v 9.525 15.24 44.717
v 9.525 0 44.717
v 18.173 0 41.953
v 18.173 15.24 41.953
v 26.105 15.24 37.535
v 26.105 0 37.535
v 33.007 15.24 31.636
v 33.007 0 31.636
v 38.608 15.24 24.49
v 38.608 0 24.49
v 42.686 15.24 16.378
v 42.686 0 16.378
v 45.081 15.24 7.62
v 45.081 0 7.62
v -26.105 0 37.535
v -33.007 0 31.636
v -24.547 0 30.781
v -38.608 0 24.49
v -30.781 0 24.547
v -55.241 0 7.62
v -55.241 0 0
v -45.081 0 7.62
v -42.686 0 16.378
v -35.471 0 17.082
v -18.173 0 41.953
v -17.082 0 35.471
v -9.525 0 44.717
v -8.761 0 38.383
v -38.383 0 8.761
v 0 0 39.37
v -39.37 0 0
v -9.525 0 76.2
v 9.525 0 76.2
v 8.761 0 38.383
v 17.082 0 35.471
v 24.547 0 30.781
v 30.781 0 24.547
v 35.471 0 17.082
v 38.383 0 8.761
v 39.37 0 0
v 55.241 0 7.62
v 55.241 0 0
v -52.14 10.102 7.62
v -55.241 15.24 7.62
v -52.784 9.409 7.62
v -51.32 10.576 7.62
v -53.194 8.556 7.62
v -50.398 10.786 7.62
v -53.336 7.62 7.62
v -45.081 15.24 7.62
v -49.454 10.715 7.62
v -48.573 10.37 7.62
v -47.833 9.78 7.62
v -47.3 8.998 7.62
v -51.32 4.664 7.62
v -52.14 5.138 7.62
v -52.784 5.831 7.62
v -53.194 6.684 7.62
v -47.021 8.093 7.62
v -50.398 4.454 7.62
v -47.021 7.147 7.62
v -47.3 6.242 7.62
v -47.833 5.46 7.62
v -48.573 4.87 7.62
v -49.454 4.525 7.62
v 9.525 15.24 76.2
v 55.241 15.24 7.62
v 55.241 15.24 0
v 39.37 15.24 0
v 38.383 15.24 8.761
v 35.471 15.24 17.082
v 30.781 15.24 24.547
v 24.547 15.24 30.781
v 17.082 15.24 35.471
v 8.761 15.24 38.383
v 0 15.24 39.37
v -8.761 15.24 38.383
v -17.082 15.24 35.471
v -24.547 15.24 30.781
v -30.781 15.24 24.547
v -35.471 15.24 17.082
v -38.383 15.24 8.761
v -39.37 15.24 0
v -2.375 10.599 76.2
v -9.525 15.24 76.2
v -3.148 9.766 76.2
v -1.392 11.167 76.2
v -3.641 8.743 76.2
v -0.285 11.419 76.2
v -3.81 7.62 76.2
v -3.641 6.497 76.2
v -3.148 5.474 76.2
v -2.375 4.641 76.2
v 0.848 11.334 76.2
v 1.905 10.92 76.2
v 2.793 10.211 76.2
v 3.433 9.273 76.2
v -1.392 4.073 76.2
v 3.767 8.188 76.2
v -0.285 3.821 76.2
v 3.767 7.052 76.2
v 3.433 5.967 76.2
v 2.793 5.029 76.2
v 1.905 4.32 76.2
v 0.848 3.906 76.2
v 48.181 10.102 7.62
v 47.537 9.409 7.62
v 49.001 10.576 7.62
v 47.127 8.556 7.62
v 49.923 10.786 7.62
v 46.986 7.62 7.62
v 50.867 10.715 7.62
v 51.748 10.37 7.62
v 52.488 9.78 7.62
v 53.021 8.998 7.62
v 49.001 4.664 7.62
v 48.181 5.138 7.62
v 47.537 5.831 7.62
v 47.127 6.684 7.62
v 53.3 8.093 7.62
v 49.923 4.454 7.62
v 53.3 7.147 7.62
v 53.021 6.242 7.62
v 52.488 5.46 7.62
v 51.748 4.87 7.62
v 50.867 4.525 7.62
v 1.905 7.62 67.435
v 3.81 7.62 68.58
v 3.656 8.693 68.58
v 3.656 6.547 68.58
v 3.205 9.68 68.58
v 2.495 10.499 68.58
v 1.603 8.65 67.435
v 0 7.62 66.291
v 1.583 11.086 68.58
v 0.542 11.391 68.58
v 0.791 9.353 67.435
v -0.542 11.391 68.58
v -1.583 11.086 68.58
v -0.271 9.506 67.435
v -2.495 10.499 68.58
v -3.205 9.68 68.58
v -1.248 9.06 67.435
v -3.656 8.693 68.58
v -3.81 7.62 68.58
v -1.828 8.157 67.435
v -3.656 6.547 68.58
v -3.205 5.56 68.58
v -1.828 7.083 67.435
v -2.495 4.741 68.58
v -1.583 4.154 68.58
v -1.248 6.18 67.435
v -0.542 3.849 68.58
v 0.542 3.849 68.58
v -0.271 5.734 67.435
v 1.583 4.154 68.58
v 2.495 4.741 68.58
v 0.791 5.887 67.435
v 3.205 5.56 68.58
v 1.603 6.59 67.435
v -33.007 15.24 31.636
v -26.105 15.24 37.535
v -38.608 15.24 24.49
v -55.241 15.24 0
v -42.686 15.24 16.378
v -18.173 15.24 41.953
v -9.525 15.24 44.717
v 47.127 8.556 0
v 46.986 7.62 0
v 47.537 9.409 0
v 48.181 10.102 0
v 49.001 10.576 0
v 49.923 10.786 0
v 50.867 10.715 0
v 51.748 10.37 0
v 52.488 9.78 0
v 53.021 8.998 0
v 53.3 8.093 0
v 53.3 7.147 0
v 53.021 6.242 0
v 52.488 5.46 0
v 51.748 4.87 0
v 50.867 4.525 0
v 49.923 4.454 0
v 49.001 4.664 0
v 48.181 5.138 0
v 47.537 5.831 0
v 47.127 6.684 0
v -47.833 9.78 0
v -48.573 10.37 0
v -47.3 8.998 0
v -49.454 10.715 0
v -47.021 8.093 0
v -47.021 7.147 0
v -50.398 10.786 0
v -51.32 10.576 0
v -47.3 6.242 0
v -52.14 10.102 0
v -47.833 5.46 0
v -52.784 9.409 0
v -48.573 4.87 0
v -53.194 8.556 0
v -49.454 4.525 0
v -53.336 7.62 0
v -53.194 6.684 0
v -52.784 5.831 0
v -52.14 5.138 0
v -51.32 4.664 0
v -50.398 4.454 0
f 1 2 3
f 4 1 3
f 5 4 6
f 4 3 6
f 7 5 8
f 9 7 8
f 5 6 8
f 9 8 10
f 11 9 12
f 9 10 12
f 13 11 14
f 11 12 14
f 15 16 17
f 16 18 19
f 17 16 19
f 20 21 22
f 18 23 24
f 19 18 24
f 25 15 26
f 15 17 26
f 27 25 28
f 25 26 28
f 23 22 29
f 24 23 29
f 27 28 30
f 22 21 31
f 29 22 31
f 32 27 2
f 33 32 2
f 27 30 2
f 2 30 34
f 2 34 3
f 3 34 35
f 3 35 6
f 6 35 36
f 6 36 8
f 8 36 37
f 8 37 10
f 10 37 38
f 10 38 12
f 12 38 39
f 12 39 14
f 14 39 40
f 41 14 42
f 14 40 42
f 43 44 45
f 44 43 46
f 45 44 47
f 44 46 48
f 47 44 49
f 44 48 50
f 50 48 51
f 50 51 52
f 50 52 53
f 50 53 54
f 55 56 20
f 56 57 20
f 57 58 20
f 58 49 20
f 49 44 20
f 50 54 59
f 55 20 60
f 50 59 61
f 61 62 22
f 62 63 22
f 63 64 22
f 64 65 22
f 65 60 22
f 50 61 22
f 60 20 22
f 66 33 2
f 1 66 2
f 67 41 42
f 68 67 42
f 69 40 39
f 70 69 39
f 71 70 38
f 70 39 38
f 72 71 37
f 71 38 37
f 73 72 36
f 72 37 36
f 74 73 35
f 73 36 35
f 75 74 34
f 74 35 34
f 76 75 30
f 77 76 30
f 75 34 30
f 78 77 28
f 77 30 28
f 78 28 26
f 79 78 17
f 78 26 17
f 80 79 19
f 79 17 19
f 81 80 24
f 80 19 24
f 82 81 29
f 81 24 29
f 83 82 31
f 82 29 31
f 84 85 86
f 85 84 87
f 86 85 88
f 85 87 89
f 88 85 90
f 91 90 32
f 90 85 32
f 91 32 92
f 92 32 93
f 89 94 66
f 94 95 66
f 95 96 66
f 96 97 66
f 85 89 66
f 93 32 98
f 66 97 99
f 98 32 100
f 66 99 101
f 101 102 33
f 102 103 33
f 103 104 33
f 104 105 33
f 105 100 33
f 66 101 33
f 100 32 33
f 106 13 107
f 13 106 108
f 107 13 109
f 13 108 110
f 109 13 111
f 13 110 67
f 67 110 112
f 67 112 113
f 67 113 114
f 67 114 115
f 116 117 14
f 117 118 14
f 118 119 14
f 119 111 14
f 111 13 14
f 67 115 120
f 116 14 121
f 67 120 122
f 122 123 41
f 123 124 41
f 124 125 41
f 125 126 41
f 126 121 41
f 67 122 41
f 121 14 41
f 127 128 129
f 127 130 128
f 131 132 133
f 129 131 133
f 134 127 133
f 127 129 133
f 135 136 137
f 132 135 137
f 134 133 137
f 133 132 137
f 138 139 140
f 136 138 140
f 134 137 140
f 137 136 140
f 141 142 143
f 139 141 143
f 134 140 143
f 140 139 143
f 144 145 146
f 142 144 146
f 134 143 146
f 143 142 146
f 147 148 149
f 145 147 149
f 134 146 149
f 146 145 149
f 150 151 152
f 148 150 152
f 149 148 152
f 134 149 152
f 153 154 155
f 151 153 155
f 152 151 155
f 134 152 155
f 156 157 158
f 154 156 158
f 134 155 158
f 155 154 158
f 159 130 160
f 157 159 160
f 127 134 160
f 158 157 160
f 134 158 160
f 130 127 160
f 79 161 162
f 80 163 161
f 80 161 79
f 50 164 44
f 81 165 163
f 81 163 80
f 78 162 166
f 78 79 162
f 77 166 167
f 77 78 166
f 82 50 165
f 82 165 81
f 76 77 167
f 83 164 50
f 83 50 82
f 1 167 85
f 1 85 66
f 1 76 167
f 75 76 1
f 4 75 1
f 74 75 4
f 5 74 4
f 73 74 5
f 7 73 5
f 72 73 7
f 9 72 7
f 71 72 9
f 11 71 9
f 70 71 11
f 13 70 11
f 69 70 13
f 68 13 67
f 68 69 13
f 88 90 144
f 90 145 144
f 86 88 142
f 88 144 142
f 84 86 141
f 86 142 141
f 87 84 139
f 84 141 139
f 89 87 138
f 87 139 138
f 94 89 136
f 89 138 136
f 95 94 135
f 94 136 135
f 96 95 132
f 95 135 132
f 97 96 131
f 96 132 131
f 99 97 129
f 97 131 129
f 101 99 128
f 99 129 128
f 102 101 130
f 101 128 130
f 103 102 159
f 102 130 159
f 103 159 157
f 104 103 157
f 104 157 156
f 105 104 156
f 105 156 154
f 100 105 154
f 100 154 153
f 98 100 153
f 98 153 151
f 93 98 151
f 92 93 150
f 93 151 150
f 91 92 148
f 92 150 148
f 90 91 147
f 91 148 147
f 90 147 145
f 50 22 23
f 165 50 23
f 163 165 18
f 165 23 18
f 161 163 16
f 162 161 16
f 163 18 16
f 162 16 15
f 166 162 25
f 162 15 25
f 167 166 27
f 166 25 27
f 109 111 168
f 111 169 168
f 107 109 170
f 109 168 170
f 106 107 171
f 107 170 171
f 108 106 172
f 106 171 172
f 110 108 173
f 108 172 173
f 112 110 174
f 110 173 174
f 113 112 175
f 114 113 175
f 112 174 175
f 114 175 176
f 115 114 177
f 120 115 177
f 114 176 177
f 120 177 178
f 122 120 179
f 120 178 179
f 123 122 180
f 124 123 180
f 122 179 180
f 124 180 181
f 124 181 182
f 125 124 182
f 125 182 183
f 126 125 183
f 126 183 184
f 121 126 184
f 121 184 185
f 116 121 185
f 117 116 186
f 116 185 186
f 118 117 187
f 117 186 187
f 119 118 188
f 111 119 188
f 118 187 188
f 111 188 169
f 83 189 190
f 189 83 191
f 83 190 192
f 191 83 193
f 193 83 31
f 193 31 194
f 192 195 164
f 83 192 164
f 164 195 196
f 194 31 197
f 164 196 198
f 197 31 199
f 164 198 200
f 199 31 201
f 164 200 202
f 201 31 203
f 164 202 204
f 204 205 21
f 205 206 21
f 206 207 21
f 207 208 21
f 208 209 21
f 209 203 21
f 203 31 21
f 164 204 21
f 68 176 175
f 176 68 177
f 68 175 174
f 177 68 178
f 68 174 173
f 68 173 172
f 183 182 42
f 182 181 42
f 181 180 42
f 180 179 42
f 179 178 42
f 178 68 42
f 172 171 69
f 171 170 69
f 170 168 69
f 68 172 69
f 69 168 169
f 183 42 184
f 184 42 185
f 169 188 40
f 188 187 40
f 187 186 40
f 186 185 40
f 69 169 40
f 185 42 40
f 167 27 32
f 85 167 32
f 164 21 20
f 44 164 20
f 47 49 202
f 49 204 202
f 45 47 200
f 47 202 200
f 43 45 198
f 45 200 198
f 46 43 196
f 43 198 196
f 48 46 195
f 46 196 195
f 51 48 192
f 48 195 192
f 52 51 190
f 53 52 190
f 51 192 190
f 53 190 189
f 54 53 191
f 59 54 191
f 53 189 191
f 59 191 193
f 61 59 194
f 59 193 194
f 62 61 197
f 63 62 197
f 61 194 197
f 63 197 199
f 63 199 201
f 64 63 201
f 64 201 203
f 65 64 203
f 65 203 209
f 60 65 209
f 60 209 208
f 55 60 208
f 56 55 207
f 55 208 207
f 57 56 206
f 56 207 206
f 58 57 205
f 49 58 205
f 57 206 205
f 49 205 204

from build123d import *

# Parameters (mm, degrees)
BOSS_EXTRUDE1_DEPTH              = 15.24
TAP_DRILL_FOR_M10X1_0_TAP1_D     = 7.62
TAP_DRILL_FOR_M10X1_0_TAP1_DEPTH = 7.62
TAP_DRILL_FOR_M10X1_0_TAP1_TIP   = 2.289278958
TAP_DRILL_FOR_M10X1_0_TAP3_D     = 6.35
TAP_DRILL_FOR_M10X1_0_TAP3_DEPTH = 7.62
TAP_DRILL_FOR_M10X1_0_TAP3_TIP   = 1.907732465


with BuildPart() as part:
    # Sketch1 → Boss-Extrude1 (new body)
    with BuildSketch(Plane(origin=(0, 0, 0), x_dir=(1, 0, 0), z_dir=(0, 1, 0))):
        with BuildLine():
            Line((-39.37, 0), (-55.240527947, 0))
            Line((-55.240527947, 0), (-55.240527947, -7.62))
            Line((-55.240527947, -7.62), (-45.080527947, -7.62))
            ThreePointArc((-45.080527947, -7.62), (-33.007335275, -31.635963998), (-9.525, -44.716806404))
            Line((-9.525, -44.716806404), (-9.525, -76.2))
            Line((-9.525, -76.2), (9.525, -76.2))
            Line((9.525, -76.2), (9.525, -44.716806404))
            ThreePointArc((9.525, -44.716806404), (33.007335275, -31.635963998), (45.080527947, -7.62))
            Line((45.080527947, -7.62), (55.240527947, -7.62))
            Line((55.240527947, -7.62), (55.240527947, 0))
            Line((55.240527947, 0), (39.37, 0))
            ThreePointArc((39.37, 0), (0, -39.37), (-39.37, 0))
        make_face()
    extrude(amount=BOSS_EXTRUDE1_DEPTH)

    # Tap Drill for M10x1.0 Tap1
    with Locations(Plane.XY.offset(76.2)):
        with Locations((0, 7.62)):
            Hole(TAP_DRILL_FOR_M10X1_0_TAP1_D / 2, depth=TAP_DRILL_FOR_M10X1_0_TAP1_DEPTH)
            with Locations((0, 0, -(TAP_DRILL_FOR_M10X1_0_TAP1_DEPTH + TAP_DRILL_FOR_M10X1_0_TAP1_TIP / 2))):  # 118° drill point
                Cone(0, TAP_DRILL_FOR_M10X1_0_TAP1_D / 2, TAP_DRILL_FOR_M10X1_0_TAP1_TIP, mode=Mode.SUBTRACT)

    # Tap Drill for M10x1.0 Tap3
    with Locations(Plane.XY.offset(7.62)):
        with Locations((-50.160527947, 7.62), (50.160527947, 7.62)):
            Hole(TAP_DRILL_FOR_M10X1_0_TAP3_D / 2, depth=TAP_DRILL_FOR_M10X1_0_TAP3_DEPTH)
            with Locations((0, 0, -(TAP_DRILL_FOR_M10X1_0_TAP3_DEPTH + TAP_DRILL_FOR_M10X1_0_TAP3_TIP / 2))):  # 118° drill point
                Cone(0, TAP_DRILL_FOR_M10X1_0_TAP3_D / 2, TAP_DRILL_FOR_M10X1_0_TAP3_TIP, mode=Mode.SUBTRACT)


solid = part.part
